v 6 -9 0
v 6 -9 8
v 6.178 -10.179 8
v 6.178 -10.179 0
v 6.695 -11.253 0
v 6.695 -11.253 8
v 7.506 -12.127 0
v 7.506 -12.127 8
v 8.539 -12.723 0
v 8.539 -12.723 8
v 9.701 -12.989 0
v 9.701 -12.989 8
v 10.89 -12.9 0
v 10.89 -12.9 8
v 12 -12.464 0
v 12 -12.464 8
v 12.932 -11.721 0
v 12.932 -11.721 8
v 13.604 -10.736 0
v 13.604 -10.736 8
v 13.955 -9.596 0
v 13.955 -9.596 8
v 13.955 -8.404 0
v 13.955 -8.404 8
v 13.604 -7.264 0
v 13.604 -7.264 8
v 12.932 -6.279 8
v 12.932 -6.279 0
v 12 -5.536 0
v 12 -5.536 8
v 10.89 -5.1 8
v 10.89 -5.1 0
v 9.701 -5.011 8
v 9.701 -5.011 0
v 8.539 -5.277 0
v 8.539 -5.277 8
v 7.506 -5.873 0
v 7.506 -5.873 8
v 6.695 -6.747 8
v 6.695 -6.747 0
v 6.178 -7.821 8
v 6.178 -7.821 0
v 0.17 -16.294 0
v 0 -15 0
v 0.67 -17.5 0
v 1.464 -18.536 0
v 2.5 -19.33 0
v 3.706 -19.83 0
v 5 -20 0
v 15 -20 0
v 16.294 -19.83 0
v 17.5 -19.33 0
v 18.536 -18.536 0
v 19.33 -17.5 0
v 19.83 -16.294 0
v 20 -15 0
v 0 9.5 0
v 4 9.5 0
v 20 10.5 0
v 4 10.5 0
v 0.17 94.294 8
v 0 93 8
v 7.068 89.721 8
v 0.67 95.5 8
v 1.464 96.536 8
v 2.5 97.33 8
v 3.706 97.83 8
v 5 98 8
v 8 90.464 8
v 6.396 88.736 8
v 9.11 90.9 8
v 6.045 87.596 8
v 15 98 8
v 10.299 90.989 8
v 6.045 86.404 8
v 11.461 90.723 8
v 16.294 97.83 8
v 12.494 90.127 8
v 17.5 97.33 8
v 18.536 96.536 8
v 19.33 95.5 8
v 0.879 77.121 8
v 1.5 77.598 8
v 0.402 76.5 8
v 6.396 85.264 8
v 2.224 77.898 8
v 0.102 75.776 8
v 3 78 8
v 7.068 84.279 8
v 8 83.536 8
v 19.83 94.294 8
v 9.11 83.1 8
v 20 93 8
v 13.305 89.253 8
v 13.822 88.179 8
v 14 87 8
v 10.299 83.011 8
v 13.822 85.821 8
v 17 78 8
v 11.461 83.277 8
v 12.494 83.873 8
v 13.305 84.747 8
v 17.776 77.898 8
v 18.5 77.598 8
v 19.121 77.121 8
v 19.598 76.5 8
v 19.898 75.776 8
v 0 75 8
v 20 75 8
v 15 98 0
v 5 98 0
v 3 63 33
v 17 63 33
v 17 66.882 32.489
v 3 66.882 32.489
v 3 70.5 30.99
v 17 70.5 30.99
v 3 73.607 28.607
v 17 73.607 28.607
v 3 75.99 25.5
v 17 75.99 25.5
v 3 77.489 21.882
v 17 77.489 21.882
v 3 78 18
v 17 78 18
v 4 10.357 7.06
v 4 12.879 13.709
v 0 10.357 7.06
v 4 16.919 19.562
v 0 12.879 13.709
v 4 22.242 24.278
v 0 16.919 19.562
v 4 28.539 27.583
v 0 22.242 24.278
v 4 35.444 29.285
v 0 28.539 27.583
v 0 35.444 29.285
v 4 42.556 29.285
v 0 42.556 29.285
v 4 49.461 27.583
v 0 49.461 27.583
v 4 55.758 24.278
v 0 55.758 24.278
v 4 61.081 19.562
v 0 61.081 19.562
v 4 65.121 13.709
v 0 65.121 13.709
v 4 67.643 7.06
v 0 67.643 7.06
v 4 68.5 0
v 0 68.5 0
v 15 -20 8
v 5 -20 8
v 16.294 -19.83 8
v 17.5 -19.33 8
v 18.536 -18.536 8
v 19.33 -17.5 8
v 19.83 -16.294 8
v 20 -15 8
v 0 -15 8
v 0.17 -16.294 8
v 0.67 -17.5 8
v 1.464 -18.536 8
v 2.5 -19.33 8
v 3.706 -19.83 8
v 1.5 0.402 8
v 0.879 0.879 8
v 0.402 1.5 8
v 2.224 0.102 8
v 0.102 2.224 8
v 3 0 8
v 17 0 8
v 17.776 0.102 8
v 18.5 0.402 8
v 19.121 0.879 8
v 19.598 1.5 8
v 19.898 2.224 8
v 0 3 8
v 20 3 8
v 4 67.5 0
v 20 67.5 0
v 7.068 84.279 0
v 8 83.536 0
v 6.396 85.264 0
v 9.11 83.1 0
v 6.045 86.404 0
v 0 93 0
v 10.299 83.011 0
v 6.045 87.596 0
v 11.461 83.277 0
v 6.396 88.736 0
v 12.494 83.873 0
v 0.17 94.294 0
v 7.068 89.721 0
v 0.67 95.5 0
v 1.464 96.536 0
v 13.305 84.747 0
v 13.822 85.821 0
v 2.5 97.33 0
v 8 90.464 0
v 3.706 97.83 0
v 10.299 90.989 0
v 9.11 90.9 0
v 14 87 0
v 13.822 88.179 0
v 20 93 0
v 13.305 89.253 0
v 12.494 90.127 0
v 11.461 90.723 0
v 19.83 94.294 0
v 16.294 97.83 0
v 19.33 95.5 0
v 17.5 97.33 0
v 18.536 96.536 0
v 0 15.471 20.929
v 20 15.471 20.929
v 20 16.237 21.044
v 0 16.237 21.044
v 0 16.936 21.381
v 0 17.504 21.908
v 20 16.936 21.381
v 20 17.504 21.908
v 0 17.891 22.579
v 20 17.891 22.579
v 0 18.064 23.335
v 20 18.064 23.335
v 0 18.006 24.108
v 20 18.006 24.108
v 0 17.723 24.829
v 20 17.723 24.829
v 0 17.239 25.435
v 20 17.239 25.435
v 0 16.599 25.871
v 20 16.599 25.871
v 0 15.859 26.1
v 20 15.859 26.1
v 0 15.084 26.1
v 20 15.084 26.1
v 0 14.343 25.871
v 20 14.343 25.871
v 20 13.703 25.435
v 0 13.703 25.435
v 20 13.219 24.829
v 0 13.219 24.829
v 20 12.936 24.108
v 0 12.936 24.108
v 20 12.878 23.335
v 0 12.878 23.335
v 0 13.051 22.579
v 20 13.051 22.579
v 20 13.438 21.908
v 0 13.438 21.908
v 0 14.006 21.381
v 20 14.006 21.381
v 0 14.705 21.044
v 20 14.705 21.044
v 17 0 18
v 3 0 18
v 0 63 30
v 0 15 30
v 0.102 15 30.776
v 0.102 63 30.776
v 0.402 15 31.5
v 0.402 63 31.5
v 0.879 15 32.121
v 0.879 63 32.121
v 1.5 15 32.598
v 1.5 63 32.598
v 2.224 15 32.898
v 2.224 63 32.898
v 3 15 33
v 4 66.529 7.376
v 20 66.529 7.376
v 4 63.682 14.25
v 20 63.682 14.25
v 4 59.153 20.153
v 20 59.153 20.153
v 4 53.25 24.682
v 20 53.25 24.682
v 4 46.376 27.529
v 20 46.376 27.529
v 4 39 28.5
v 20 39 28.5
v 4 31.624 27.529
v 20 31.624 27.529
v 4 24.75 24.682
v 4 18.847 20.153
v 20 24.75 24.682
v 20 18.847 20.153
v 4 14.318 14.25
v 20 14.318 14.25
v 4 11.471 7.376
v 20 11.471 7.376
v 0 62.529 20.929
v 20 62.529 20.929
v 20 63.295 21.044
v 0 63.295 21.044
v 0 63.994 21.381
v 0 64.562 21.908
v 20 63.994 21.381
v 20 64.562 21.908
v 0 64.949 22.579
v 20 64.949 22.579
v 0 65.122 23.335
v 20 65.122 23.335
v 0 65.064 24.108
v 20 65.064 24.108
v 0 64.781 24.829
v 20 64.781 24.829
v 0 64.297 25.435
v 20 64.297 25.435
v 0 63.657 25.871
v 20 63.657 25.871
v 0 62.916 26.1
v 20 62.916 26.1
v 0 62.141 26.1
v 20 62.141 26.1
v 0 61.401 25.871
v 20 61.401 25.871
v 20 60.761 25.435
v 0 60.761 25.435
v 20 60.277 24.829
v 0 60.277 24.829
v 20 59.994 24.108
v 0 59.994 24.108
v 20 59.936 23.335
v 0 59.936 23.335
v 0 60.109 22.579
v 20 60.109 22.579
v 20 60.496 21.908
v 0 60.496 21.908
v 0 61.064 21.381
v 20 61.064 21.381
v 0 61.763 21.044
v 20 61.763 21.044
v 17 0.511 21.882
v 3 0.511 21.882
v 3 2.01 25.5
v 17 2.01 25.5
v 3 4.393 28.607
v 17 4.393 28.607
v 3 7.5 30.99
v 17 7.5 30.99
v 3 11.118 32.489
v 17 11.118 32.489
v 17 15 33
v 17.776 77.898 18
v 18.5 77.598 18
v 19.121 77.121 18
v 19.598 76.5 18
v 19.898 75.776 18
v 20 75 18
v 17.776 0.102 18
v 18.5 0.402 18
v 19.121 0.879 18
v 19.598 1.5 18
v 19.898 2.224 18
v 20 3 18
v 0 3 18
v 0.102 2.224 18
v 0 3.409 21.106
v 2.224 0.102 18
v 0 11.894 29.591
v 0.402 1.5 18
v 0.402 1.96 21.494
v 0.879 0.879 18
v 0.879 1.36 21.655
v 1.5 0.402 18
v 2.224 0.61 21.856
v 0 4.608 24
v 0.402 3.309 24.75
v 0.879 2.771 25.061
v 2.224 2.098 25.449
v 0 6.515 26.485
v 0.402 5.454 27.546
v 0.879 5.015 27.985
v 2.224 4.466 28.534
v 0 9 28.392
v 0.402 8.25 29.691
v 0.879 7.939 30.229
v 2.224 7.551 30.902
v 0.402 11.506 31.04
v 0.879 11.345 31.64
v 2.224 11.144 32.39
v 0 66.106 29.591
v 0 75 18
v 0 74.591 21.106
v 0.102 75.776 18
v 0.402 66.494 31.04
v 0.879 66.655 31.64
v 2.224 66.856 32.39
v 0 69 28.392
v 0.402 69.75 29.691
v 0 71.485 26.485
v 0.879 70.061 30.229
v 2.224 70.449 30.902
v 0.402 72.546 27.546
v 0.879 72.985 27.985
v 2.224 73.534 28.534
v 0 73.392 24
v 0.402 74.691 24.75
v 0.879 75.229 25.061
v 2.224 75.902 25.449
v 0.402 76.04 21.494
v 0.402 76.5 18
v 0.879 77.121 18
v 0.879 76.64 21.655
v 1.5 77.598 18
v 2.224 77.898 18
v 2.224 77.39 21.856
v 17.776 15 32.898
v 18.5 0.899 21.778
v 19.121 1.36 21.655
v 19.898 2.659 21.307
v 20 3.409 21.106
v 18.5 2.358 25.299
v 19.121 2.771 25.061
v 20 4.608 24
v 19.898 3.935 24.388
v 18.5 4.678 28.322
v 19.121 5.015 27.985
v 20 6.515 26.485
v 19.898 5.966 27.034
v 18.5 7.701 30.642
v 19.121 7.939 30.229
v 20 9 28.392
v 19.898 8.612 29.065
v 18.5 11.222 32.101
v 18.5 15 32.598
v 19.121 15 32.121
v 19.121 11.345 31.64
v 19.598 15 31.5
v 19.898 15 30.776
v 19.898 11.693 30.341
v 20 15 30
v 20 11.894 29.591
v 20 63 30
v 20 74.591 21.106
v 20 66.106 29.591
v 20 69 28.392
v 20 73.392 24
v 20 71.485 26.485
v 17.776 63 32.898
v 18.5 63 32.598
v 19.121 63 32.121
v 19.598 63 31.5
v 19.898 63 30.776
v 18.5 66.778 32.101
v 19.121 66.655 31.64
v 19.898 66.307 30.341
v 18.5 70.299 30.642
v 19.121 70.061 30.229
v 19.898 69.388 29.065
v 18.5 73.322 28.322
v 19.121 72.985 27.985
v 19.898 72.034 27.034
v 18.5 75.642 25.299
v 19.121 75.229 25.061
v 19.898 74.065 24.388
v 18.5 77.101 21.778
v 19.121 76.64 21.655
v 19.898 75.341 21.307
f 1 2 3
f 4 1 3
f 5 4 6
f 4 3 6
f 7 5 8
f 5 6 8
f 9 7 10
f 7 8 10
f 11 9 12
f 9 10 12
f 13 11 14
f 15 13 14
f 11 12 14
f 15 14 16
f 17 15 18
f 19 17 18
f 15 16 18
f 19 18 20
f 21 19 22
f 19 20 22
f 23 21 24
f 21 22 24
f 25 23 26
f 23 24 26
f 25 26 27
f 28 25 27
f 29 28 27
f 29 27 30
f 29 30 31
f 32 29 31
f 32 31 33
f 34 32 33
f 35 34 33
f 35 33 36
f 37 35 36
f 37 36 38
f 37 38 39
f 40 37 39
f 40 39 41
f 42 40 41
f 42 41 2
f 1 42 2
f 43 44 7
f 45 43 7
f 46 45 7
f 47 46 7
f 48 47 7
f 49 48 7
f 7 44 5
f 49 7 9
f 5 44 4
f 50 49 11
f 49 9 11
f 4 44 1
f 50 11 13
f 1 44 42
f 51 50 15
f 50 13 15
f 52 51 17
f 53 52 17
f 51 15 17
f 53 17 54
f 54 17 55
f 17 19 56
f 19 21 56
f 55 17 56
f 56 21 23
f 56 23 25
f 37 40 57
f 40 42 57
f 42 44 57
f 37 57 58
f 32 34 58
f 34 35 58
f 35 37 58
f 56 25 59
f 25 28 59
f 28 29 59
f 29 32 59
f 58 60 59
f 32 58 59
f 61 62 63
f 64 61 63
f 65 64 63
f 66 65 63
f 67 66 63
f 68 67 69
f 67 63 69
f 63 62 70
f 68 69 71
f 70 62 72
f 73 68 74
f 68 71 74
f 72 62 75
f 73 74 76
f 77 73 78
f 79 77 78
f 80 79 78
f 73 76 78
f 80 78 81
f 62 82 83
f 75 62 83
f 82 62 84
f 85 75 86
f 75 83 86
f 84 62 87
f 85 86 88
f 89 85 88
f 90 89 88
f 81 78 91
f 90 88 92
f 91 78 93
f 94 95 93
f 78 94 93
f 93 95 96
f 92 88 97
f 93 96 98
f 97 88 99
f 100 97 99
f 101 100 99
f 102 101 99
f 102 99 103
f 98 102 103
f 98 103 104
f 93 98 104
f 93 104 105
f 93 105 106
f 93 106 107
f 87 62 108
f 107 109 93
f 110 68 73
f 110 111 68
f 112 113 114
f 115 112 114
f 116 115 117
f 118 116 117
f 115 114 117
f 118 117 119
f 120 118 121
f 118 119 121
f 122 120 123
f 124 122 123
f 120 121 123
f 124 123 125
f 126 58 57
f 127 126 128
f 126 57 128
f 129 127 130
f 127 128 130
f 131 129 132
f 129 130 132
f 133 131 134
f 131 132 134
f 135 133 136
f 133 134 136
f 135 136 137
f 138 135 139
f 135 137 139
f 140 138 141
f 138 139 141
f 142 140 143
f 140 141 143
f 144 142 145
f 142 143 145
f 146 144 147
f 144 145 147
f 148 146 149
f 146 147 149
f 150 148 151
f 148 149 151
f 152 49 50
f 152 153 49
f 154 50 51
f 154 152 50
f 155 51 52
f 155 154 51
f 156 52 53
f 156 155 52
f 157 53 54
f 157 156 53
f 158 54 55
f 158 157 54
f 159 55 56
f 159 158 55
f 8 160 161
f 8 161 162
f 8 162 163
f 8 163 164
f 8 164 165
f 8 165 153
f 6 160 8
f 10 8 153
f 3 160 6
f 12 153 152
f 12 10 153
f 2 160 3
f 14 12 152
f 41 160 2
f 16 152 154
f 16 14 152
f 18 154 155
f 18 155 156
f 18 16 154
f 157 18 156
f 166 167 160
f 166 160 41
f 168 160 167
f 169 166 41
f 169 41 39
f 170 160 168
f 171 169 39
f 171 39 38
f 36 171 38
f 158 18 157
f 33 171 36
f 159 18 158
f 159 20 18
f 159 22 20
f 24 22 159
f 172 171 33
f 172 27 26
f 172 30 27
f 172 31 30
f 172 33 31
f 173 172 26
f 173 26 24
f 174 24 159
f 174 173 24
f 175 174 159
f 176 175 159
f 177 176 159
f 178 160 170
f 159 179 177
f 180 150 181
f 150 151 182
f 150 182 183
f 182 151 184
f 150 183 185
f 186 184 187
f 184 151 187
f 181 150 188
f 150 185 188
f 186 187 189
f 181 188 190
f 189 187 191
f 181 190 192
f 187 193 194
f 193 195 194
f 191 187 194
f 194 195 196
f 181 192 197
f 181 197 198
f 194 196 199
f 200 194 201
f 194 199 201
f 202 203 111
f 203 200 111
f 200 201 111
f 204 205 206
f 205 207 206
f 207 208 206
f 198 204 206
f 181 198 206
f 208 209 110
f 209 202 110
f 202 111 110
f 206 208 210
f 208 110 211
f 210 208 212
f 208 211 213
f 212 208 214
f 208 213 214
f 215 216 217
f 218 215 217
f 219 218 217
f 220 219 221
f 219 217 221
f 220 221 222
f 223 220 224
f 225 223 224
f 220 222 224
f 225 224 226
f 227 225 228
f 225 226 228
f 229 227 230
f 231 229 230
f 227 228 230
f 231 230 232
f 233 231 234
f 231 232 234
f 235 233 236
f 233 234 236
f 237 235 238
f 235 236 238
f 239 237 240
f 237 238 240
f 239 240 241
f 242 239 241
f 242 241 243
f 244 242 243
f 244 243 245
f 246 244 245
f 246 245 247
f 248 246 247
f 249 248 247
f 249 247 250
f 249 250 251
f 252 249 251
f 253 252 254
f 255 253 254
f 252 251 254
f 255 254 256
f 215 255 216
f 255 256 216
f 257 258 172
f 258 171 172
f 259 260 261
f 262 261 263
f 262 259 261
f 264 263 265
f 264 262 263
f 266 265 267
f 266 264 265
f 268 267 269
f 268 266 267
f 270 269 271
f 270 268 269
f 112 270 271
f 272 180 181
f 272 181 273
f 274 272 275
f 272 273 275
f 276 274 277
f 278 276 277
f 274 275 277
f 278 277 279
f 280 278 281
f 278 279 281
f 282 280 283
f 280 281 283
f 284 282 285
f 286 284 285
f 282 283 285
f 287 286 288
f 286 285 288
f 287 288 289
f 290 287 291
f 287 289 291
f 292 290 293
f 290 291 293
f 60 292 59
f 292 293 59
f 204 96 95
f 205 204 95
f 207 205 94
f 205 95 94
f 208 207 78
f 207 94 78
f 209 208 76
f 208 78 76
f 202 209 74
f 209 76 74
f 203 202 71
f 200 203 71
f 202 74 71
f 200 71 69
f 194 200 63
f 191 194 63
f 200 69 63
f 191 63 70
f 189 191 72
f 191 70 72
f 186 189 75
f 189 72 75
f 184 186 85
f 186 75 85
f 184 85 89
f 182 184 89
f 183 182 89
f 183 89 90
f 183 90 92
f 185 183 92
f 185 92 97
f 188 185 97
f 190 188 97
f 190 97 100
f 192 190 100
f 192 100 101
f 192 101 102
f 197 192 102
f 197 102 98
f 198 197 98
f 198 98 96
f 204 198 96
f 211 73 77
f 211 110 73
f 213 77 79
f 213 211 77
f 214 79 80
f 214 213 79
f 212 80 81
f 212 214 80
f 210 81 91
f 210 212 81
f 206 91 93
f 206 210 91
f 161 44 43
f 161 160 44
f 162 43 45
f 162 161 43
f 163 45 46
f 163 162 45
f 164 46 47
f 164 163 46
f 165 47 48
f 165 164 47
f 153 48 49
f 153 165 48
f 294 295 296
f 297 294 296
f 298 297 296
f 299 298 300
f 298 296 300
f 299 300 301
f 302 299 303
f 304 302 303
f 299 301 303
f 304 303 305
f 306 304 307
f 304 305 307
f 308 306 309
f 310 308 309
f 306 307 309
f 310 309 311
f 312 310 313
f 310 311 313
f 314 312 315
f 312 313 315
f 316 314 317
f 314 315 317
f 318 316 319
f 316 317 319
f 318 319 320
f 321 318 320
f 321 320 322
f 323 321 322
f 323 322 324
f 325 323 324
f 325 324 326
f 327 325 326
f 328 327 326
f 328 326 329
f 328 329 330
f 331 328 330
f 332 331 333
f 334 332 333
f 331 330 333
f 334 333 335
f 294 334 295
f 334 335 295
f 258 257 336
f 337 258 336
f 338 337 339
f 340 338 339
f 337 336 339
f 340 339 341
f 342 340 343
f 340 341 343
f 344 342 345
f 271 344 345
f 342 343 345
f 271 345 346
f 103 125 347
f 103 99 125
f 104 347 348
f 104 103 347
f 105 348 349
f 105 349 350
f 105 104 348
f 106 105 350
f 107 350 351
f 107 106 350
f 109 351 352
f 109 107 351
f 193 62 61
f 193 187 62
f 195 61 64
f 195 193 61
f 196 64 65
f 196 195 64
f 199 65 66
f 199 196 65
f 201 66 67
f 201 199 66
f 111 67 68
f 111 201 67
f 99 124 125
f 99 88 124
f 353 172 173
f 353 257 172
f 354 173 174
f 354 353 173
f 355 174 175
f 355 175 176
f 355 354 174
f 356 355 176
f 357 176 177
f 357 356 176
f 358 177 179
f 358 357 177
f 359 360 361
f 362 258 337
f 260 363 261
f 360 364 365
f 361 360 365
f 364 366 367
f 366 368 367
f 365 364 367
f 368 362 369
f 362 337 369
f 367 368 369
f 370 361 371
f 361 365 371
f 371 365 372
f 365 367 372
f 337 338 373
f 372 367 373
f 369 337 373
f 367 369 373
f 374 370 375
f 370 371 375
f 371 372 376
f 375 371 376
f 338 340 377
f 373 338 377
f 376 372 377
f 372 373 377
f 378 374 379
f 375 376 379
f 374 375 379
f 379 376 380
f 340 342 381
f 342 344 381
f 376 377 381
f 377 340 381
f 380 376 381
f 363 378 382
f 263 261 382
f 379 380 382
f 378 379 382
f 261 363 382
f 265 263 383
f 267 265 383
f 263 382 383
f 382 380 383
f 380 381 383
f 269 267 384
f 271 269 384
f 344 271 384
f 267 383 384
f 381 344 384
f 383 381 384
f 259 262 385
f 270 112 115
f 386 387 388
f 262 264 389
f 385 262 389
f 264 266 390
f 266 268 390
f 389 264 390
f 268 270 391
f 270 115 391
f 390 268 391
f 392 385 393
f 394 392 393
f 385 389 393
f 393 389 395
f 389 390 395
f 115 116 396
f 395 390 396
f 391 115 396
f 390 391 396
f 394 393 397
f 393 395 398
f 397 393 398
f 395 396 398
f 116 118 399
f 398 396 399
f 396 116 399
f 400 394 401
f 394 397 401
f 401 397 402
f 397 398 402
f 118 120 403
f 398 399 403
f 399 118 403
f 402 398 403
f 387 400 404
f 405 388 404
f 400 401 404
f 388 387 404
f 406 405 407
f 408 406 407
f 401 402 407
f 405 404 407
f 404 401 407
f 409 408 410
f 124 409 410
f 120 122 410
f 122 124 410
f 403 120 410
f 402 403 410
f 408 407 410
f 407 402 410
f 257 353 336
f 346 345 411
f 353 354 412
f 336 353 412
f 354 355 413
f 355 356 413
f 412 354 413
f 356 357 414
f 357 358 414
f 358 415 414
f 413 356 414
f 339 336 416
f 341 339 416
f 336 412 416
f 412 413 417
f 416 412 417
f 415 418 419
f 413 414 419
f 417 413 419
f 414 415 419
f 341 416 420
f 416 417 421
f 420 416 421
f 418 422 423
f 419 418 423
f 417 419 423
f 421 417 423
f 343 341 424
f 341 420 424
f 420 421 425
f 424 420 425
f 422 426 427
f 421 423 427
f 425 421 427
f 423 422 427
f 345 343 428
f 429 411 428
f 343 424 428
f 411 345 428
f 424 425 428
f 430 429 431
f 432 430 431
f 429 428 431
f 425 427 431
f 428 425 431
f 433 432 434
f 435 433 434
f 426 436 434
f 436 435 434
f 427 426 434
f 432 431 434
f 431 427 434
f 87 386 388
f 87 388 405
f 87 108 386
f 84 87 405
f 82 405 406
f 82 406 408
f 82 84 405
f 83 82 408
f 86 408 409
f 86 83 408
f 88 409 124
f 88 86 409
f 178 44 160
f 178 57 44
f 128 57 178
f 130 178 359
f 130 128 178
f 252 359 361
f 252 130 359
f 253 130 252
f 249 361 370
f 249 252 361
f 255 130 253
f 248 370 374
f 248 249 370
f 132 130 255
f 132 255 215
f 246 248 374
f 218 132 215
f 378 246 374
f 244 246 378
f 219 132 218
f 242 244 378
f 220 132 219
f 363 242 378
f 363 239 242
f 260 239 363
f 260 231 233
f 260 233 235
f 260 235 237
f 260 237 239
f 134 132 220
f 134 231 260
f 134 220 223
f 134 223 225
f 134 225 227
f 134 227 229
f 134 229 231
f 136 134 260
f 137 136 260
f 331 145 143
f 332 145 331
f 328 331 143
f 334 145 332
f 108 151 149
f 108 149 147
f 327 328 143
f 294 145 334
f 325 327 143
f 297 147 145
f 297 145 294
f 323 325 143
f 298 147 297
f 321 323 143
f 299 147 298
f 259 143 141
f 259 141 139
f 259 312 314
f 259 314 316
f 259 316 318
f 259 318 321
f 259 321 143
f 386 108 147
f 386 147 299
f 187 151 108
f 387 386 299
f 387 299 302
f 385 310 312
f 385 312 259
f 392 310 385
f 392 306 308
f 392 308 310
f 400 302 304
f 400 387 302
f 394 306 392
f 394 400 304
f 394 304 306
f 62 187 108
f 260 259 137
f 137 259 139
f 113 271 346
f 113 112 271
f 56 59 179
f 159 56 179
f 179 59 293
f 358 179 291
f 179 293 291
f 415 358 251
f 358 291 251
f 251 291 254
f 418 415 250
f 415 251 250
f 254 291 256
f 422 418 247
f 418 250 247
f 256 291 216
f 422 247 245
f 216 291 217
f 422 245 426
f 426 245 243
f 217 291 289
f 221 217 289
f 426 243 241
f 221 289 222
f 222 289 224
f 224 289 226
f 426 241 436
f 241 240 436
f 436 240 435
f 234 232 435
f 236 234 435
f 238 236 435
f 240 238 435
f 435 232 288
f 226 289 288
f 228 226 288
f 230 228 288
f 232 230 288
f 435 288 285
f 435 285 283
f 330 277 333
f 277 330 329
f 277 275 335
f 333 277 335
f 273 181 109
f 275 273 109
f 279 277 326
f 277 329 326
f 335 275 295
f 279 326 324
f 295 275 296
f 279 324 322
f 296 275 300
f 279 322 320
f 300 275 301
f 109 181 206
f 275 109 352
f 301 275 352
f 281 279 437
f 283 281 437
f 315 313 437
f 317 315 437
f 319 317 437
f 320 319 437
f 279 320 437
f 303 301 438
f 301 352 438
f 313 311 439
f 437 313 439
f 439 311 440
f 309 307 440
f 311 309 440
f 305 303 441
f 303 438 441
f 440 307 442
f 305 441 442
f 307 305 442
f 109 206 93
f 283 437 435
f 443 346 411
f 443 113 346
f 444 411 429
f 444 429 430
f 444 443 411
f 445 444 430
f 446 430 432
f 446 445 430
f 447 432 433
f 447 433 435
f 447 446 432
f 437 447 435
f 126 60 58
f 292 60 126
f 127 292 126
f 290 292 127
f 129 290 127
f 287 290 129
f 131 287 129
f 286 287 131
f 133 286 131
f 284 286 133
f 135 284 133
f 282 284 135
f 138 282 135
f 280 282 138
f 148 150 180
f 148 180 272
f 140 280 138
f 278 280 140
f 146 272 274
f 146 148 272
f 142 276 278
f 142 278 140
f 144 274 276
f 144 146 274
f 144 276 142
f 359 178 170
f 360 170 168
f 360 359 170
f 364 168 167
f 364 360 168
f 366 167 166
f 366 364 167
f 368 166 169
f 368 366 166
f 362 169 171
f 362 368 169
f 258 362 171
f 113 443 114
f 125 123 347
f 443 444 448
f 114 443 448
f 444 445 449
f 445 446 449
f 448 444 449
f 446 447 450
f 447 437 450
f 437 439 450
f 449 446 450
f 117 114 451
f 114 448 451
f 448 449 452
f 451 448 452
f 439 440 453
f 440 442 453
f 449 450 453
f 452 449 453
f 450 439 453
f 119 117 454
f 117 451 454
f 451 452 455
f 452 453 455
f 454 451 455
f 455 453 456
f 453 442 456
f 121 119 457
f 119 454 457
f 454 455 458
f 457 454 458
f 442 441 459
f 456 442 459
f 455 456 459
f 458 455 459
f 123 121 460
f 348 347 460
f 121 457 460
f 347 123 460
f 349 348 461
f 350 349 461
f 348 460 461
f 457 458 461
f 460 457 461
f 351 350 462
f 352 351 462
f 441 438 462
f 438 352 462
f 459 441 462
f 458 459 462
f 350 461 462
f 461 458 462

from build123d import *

# Parameters (mm, degrees)
ESQUISSE1_W             = 20
ESQUISSE1_H             = 78
BOSS_EXTRU_1_DEPTH      = 33
ESQUISSE2_W             = 20
ESQUISSE2_H             = 8
BOSS_EXTRU_2_DEPTH      = 20
ESQUISSE3_W             = 20
ESQUISSE3_H             = 8
BOSS_EXTRU_3_DEPTH      = 20
ESQUISSE4_R             = 4
ENL_V_MAT_EXTRU_1_DEPTH = 10
CONG_1_R                = 5
ESQUISSE5_R             = 28.5
ENL_V_MAT_EXTRU_2_DEPTH = 30
ESQUISSE6_R             = 2.6
ENL_V_MAT_EXTRU_3_DEPTH = 20
CONG_4_R                = 15
CONG_5_R                = 3
ESQUISSE7_R             = 29.5
ENL_V_MAT_EXTRU_4_DEPTH = 4


with BuildPart() as part:
    # Esquisse1 → Boss.-Extru.1 (new body)
    with BuildSketch(Plane.XY):
        with Locations((10, 39)):
            Rectangle(ESQUISSE1_W, ESQUISSE1_H)
    extrude(amount=BOSS_EXTRU_1_DEPTH)

    # Esquisse2 → Boss.-Extru.2 (add)
    with BuildSketch(Plane(origin=(0, 78, 0), x_dir=(1, 0, 0), z_dir=(0, 1, 0))):
        with Locations((10, -4)):
            Rectangle(ESQUISSE2_W, ESQUISSE2_H)
    extrude(amount=BOSS_EXTRU_2_DEPTH)

    # Esquisse3 → Boss.-Extru.3 (add)
    with BuildSketch(Plane.XZ):
        with Locations((10, 4)):
            Rectangle(ESQUISSE3_W, ESQUISSE3_H)
    extrude(amount=BOSS_EXTRU_3_DEPTH)

    # Esquisse4 → Enlèv. mat.-Extru.1 (cut)
    with BuildSketch(Plane.XY.offset(8)):
        with Locations((10, 87)):
            Circle(ESQUISSE4_R)
        with Locations(Location((10, -9, 0), (0, 0, 180))):
            Circle(ESQUISSE4_R)
    extrude(amount=-ENL_V_MAT_EXTRU_1_DEPTH, mode=Mode.SUBTRACT)

    # Congé1
    cong_1_edges = [part.edges().sort_by_distance(p)[0] for p in [
        (0, 98, 4),
        (20, 98, 4),
        (0, -20, 4),
        (20, -20, 4),
    ]]
    fillet(cong_1_edges, radius=CONG_1_R)

    # Esquisse5 → Enlèv. mat.-Extru.2 (cut)
    with BuildSketch(Plane(origin=(20, 0, 0), x_dir=(0, 0, -1), z_dir=(1, 0, 0))):
        with Locations((0, 39)):
            Circle(ESQUISSE5_R)
    extrude(amount=-ENL_V_MAT_EXTRU_2_DEPTH, mode=Mode.SUBTRACT)

    # Esquisse6 → Enlèv. mat.-Extru.3 (cut)
    with BuildSketch(Plane(origin=(20, 0, 0), x_dir=(0, 0, -1), z_dir=(1, 0, 0))):
        with Locations((-23.528978144, 15.471021856)):
            Circle(ESQUISSE6_R)
        with Locations((-23.528978144, 62.528978144)):
            Circle(ESQUISSE6_R)
    extrude(amount=-ENL_V_MAT_EXTRU_3_DEPTH, mode=Mode.SUBTRACT)

    # Congé4
    cong_4_edges = [part.edges().sort_by_distance(p)[0] for p in [
        (10, 78, 33),
        (10, 0, 33),
    ]]
    fillet(cong_4_edges, radius=CONG_4_R)

    # Congé5
    cong_5_edges = [part.edges().sort_by_distance(p)[0] for p in [
        (0, 39, 33),
        (20, 39, 33),
        (20, 78, 13),
        (20, 0, 13),
        (20, 73.606601718, 28.606601718),
        (20, 4.393398282, 28.606601718),
        (0, 0, 13),
        (0, 78, 13),
        (0, 73.606601718, 28.606601718),
        (0, 4.393398282, 28.606601718),
    ]]
    fillet(cong_5_edges, radius=CONG_5_R)

    # Esquisse7 → Enlèv. mat.-Extru.4 (cut)
    with BuildSketch(Plane.ZY):
        with Locations((0, 39)):
            Circle(ESQUISSE7_R)
    extrude(amount=-ENL_V_MAT_EXTRU_4_DEPTH, mode=Mode.SUBTRACT)


solid = part.part
